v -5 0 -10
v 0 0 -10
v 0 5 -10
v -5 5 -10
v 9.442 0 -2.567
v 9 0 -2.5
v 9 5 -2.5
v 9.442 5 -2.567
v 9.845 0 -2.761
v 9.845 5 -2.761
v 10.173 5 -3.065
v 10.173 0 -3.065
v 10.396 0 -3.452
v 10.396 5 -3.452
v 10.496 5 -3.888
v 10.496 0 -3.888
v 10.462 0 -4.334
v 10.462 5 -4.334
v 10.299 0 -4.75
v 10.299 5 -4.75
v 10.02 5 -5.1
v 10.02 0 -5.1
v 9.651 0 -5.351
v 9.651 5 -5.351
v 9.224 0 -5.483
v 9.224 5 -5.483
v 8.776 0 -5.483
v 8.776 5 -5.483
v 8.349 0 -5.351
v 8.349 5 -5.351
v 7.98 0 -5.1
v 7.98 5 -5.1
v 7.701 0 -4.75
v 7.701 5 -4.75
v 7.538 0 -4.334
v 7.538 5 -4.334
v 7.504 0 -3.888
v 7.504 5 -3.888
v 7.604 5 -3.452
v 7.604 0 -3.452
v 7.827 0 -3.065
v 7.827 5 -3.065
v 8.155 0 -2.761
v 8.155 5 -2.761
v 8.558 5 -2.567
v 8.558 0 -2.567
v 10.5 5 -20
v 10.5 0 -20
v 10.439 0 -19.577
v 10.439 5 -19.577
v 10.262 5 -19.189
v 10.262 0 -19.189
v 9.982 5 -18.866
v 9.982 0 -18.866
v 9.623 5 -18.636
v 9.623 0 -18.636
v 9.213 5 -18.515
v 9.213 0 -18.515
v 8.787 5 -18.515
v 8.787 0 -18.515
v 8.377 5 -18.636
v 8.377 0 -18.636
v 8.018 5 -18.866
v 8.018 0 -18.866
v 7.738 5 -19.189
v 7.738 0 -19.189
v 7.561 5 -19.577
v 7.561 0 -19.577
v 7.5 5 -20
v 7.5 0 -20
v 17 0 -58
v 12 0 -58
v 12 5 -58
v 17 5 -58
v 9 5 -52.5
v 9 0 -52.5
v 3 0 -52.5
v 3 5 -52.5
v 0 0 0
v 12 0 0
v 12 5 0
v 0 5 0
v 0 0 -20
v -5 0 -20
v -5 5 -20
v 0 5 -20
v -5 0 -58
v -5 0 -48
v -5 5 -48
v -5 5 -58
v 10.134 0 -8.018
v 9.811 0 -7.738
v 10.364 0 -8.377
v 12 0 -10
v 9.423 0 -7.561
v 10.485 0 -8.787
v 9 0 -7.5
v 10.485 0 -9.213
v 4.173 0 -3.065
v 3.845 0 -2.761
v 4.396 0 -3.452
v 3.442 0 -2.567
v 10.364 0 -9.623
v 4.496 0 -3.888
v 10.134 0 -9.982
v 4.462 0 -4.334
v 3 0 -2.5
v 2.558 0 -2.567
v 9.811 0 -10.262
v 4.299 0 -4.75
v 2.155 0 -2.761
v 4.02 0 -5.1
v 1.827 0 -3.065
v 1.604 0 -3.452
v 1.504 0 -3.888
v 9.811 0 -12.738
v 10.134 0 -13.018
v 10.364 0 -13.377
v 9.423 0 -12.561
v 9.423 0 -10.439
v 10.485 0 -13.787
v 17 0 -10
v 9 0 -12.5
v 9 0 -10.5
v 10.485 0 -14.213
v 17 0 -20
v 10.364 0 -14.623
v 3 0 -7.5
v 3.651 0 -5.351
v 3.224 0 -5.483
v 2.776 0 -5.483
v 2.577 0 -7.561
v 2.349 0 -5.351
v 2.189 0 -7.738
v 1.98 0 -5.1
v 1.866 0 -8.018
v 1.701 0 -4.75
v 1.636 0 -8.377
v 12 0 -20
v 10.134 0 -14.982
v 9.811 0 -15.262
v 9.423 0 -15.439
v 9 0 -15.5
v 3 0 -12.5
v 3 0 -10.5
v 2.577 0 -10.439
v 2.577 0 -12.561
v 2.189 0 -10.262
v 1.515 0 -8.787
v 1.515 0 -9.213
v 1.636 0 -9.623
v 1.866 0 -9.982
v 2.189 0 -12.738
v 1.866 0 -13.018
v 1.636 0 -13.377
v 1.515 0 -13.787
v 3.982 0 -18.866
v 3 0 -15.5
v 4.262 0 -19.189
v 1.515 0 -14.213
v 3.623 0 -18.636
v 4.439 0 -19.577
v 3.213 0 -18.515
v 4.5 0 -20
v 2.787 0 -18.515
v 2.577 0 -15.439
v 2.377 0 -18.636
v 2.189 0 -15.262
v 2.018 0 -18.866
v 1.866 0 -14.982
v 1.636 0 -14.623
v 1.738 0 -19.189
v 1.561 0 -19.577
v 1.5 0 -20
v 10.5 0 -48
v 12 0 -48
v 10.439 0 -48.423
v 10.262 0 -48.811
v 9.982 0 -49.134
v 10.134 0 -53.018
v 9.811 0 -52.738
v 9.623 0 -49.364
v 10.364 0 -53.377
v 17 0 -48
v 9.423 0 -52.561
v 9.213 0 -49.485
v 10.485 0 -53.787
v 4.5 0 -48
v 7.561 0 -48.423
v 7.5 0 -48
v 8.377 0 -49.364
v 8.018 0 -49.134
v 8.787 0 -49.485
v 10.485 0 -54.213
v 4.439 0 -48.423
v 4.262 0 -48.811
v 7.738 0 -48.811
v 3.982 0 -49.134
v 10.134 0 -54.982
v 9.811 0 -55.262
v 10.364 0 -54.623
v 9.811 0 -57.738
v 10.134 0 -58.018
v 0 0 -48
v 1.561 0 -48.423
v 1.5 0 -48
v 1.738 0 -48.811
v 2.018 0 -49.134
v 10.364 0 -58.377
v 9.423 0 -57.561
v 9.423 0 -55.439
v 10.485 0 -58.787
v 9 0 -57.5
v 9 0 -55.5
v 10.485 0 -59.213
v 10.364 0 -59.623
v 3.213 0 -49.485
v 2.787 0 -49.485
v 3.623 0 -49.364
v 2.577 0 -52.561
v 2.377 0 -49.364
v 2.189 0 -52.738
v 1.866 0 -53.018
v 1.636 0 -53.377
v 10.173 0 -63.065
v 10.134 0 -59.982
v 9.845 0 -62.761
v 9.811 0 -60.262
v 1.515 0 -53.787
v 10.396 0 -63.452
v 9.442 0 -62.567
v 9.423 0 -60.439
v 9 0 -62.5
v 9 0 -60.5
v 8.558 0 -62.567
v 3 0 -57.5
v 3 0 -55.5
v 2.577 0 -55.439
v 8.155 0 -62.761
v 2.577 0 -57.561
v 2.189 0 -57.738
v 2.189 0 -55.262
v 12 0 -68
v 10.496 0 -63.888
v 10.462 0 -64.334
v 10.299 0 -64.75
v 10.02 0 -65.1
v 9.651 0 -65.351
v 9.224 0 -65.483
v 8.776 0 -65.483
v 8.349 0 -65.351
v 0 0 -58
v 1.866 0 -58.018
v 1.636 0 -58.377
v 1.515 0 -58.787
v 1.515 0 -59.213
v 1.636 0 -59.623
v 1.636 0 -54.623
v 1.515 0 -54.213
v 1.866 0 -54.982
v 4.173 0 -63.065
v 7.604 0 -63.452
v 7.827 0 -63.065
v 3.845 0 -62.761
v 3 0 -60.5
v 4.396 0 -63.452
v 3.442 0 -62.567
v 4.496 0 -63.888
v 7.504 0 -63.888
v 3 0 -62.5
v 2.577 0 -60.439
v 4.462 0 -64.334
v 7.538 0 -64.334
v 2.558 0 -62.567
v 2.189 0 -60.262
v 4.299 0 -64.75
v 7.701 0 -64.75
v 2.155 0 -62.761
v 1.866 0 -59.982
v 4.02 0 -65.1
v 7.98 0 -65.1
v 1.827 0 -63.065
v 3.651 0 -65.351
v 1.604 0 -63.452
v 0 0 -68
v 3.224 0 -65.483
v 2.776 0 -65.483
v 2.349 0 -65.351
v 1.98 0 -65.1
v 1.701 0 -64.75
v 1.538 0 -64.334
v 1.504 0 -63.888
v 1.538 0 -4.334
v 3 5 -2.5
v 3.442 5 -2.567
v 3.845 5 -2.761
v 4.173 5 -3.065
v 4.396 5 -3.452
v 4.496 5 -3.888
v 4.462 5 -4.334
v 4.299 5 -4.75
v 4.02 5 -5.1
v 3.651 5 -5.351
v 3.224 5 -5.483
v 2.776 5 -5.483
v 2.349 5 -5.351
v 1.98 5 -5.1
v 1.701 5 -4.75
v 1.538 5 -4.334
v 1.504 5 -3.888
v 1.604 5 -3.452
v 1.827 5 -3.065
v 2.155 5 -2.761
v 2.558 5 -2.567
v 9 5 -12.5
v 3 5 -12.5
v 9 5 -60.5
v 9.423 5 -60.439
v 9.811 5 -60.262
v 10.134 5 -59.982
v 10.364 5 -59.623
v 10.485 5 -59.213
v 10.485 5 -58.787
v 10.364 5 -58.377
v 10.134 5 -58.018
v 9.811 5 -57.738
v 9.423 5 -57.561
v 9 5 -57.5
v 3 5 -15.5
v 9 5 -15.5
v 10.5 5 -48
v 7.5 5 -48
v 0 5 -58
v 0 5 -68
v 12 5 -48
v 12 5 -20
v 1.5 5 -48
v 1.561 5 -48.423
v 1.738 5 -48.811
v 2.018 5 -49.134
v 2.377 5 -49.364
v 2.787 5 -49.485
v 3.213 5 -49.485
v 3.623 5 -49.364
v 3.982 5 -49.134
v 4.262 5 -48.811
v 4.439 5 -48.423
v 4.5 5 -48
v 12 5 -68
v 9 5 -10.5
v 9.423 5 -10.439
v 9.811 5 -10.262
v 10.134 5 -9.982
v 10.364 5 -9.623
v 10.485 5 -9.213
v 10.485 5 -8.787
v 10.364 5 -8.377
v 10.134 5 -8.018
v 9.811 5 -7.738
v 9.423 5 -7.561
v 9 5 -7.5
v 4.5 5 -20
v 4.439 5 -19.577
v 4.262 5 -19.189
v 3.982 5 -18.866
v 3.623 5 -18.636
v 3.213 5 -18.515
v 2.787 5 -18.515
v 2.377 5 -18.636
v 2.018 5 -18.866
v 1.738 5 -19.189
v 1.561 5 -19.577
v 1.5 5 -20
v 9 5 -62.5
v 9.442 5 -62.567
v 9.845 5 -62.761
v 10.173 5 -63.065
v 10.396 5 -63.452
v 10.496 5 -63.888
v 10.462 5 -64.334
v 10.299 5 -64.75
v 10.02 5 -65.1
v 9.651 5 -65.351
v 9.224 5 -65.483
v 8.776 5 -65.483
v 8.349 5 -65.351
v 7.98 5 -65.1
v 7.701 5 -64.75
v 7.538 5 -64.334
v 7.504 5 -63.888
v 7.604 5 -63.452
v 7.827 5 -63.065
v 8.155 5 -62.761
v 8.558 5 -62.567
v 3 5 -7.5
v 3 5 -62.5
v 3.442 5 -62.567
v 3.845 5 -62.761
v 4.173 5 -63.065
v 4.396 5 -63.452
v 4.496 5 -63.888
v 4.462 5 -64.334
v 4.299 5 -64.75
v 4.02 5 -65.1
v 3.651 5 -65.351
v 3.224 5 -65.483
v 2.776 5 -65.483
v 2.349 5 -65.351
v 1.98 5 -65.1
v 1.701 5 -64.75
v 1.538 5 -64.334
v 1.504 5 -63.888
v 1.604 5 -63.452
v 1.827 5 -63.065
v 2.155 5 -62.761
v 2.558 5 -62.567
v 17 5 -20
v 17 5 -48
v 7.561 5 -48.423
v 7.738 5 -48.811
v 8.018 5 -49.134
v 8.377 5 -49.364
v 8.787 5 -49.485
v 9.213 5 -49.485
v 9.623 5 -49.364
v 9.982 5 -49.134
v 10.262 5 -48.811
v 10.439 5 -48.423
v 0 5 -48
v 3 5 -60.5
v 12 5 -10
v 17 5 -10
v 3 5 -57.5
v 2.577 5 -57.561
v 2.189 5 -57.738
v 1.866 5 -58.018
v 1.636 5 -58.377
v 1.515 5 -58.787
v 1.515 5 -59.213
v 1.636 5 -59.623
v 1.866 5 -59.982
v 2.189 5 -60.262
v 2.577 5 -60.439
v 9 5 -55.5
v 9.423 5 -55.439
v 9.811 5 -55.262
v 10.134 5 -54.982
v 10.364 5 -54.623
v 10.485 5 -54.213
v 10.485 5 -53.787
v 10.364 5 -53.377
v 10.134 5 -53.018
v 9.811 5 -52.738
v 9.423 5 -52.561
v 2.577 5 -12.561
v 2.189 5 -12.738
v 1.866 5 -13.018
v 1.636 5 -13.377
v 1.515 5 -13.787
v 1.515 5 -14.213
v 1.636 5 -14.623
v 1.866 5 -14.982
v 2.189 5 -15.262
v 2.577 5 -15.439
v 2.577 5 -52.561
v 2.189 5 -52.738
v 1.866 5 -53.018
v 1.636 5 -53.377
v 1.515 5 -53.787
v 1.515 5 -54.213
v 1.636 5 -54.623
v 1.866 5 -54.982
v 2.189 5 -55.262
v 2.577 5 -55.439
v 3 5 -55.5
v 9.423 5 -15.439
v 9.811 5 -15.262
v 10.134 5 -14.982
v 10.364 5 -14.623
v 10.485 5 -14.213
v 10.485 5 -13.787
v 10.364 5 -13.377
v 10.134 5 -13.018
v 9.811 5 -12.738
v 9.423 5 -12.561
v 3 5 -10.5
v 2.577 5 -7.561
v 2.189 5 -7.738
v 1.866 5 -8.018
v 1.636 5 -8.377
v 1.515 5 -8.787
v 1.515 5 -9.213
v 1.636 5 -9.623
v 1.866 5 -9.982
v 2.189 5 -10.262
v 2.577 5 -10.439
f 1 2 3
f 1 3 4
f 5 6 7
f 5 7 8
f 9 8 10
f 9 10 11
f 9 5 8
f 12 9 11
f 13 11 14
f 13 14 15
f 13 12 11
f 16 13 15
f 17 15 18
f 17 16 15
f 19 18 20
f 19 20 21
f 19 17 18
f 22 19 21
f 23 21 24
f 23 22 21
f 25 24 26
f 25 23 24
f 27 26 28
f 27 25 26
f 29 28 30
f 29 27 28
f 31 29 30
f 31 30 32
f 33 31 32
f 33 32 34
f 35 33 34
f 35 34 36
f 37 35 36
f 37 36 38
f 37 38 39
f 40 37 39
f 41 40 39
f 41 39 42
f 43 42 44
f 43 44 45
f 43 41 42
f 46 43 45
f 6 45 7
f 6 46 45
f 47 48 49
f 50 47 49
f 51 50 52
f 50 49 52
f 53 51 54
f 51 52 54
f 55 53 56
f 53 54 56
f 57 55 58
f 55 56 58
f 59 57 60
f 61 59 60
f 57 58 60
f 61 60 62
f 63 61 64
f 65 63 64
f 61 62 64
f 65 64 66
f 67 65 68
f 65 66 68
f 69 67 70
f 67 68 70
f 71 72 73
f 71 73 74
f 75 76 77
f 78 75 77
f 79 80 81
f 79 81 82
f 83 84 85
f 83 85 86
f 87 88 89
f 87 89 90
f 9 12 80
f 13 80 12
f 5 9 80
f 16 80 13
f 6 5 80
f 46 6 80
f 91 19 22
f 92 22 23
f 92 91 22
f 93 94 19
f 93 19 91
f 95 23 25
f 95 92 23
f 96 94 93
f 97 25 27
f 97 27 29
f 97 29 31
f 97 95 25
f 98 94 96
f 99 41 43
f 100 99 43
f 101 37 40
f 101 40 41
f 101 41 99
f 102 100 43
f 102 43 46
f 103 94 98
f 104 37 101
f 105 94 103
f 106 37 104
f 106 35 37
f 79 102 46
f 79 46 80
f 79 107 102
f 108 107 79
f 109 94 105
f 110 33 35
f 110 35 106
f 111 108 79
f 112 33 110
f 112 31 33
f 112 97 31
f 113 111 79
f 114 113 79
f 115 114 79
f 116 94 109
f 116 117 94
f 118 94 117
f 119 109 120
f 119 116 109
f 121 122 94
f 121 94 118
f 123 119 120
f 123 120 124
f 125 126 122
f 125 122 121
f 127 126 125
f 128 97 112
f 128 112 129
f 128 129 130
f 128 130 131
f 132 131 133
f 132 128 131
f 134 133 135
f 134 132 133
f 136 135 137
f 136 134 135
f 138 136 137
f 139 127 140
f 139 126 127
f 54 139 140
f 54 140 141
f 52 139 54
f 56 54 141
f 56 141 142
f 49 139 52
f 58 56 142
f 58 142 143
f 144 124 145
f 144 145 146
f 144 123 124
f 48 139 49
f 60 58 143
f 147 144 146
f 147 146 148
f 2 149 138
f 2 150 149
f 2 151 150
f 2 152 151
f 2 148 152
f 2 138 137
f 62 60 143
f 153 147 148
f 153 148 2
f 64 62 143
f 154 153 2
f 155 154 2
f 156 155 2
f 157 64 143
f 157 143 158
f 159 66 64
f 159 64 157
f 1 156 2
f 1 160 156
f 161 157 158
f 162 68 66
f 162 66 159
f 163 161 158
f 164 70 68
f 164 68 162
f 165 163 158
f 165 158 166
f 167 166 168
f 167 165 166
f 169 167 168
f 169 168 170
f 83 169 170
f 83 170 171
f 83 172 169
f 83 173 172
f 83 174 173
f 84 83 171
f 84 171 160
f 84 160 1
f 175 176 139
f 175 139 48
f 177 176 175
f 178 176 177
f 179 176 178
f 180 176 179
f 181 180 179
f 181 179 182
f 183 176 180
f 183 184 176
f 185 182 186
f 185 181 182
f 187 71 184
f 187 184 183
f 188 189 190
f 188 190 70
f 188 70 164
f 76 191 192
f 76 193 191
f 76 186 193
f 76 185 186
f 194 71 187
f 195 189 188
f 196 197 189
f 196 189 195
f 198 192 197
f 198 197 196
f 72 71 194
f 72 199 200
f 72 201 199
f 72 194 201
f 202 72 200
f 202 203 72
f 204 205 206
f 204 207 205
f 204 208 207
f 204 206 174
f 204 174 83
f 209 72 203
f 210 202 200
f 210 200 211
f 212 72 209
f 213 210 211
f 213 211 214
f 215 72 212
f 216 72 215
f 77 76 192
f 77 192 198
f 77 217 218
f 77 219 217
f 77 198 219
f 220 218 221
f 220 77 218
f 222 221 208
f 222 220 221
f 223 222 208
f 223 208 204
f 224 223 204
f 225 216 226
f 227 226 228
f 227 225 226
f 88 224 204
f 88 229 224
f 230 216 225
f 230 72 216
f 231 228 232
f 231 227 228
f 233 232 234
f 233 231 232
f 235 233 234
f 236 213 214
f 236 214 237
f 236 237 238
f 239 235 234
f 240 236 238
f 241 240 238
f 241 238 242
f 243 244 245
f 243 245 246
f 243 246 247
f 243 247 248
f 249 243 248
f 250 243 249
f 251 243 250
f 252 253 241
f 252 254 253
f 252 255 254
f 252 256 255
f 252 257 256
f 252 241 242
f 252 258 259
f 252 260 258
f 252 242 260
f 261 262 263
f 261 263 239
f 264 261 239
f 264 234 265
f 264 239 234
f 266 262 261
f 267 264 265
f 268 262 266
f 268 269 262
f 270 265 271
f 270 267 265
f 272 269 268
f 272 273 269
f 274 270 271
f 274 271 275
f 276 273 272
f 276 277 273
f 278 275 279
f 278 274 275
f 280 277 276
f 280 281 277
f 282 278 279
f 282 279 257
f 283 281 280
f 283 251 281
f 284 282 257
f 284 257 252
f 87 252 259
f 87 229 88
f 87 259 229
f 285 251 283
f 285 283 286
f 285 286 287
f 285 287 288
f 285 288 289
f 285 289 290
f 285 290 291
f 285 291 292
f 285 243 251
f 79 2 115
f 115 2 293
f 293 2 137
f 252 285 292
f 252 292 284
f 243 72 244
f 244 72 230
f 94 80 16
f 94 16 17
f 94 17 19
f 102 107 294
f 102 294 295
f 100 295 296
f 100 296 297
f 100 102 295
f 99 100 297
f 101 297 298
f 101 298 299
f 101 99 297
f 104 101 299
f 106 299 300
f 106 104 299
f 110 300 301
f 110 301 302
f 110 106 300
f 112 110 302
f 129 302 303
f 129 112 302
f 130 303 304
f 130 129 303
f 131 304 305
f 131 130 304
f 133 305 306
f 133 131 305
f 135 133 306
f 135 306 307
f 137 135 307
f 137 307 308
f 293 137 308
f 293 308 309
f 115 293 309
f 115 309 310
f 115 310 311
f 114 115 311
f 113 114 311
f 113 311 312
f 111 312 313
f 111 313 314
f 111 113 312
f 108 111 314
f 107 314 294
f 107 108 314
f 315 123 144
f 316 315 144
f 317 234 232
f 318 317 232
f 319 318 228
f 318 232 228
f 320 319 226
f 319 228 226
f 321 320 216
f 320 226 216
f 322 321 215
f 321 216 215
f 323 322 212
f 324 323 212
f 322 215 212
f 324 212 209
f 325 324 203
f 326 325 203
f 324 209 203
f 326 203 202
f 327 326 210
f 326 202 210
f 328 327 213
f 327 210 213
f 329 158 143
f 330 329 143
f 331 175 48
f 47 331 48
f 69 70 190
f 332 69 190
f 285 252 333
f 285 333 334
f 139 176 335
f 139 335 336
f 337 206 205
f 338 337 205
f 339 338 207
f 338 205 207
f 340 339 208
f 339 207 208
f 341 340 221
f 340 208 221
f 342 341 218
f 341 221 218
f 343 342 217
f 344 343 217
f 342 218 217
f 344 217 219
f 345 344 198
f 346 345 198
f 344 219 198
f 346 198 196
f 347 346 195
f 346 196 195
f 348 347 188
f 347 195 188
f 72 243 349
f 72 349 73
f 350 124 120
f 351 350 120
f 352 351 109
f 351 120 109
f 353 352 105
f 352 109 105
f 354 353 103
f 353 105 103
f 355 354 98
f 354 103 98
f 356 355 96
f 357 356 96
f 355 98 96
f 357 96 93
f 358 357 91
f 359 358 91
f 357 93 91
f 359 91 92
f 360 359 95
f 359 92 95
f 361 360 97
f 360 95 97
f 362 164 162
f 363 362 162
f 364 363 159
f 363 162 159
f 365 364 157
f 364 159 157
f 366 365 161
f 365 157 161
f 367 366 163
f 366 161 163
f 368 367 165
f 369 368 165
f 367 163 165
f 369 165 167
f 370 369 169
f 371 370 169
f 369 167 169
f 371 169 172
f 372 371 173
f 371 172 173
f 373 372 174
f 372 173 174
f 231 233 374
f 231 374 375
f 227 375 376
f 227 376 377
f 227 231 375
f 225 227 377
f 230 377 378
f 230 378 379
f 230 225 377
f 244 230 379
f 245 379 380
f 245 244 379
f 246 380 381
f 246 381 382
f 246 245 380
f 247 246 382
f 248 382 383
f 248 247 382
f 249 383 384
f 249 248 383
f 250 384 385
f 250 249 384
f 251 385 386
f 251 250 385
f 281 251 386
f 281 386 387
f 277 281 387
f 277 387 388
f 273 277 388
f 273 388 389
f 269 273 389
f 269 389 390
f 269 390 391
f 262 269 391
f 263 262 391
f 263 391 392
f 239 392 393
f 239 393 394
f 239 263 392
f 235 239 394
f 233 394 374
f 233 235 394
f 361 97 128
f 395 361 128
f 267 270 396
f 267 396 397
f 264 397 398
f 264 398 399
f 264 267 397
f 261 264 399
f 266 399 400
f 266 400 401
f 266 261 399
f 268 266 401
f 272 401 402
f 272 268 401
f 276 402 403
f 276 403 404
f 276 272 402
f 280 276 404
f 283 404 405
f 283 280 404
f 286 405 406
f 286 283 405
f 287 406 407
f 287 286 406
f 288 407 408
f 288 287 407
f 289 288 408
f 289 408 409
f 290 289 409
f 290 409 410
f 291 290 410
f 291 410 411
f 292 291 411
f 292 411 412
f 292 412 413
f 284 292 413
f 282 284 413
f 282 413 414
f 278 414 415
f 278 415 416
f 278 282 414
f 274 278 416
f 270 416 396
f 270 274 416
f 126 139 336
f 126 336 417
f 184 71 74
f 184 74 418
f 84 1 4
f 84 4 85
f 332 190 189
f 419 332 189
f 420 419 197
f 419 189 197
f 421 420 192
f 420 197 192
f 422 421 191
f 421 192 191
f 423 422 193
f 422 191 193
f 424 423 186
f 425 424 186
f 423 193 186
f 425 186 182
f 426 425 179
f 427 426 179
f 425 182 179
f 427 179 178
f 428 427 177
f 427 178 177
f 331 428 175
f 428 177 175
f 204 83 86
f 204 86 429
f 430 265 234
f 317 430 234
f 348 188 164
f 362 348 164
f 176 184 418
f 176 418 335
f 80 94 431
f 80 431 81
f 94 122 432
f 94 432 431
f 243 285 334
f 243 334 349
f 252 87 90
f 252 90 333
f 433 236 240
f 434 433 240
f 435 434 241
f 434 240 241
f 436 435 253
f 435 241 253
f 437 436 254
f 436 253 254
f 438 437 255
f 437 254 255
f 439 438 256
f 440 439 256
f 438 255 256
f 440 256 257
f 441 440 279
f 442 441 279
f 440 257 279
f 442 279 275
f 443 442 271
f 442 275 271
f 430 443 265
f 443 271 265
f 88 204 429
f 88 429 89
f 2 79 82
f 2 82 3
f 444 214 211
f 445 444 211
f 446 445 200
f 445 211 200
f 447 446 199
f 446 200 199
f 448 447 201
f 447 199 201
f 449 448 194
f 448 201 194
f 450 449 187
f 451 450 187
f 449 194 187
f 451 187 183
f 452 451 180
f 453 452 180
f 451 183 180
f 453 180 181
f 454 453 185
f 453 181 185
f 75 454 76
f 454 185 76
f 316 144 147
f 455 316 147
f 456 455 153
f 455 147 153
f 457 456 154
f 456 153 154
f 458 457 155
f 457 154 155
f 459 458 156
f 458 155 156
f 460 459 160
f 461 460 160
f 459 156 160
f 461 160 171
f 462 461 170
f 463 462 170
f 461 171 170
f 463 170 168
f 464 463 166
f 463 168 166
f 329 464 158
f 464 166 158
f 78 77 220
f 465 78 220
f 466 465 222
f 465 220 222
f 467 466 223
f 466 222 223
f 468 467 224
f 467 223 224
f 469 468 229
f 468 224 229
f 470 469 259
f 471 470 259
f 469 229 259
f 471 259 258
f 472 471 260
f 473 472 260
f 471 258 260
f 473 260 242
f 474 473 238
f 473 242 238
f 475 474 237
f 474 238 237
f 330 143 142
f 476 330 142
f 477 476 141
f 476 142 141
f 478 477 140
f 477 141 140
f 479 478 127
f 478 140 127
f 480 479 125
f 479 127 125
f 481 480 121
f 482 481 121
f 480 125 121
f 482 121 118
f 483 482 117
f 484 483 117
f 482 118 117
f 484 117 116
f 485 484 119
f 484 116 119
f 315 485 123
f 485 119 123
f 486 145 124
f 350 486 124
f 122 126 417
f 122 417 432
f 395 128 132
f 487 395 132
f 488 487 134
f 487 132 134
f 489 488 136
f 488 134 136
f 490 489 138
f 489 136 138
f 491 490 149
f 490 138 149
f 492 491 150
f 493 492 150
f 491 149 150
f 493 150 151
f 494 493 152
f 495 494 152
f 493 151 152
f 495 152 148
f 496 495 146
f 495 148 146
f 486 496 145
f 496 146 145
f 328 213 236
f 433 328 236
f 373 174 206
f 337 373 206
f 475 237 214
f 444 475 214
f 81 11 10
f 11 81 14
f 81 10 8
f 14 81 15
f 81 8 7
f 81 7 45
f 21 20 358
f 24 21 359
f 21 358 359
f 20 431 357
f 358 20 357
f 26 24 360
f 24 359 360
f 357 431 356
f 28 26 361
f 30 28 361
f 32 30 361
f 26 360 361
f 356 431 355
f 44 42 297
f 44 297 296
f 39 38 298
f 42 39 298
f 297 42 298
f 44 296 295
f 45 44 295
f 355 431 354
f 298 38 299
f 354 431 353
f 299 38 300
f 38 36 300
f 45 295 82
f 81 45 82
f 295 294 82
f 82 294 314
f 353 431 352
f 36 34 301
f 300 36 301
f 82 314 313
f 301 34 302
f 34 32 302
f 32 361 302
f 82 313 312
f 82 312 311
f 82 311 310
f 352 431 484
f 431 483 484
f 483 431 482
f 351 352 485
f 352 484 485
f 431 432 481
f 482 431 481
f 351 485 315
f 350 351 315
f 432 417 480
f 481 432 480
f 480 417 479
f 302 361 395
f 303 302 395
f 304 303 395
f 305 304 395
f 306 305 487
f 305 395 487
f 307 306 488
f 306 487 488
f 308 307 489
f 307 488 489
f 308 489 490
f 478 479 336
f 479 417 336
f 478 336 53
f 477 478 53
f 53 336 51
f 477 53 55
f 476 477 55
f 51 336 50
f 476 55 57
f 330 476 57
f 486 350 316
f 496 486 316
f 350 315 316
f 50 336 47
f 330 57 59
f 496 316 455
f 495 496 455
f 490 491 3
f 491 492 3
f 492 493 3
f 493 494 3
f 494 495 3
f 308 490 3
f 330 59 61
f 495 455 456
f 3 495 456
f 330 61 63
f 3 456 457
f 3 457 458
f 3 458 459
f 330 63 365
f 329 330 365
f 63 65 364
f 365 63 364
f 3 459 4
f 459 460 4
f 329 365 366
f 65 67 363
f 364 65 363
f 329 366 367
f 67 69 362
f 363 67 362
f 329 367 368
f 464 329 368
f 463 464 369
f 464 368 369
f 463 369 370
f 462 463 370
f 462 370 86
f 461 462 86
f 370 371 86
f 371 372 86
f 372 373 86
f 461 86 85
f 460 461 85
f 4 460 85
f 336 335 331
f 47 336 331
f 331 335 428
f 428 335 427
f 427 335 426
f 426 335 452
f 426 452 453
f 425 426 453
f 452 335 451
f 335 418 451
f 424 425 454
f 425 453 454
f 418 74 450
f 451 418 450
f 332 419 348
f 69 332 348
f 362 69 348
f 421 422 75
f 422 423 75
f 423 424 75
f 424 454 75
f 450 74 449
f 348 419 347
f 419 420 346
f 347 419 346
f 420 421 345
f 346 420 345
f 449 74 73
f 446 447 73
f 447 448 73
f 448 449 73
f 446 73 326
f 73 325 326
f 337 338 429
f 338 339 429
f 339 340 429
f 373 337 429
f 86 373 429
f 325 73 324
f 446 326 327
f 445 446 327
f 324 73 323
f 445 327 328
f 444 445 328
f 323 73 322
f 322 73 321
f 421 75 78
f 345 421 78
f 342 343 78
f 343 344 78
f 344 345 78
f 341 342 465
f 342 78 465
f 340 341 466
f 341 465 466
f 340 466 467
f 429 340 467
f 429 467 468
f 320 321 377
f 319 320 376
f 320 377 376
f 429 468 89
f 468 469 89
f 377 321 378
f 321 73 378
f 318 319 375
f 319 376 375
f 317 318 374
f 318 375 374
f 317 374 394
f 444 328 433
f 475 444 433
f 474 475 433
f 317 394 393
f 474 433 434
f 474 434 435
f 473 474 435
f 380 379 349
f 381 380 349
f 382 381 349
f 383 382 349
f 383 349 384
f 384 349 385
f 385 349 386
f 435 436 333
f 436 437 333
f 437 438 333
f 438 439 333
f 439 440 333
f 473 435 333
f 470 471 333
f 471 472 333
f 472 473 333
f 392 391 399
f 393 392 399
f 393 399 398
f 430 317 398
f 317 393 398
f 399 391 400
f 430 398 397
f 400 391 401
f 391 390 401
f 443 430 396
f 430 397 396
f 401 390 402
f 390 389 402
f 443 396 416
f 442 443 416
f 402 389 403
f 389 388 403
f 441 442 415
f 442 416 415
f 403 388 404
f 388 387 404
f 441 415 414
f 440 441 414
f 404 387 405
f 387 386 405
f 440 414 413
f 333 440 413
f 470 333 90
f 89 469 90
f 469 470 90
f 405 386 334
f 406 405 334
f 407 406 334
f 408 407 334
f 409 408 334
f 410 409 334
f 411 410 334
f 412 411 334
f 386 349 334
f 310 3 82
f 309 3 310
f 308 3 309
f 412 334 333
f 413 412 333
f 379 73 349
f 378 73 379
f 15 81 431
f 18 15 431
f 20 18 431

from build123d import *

# Parameters (mm, degrees)
SKETCH_1_R      = 1.5
EXTRUDE_1_DEPTH = 5


with BuildPart() as part:
    # 草图1 → 凸台-拉伸1 (new body)
    with BuildSketch(Plane(origin=(0, 0, 0), x_dir=(1, 0, 0), z_dir=(0, 1, 0))):
        Polygon((0, 0), (0, 10), (-5, 10), (-5, 20), (0, 20), (0, 48), (-5, 48), (-5, 58), (0, 58), (0, 68), (12, 68), (12, 58), (17, 58), (17, 48), (12, 48), (12, 20), (17, 20), (17, 10), (12, 10), (12, 0), align=None)
        with Locations(Location((3, 64, 0), (0, 0, 270))):
            Circle(SKETCH_1_R, mode=Mode.SUBTRACT)
        with Locations(Location((9, 64, 0), (0, 0, 270))):
            Circle(SKETCH_1_R, mode=Mode.SUBTRACT)
        with Locations(Location((3, 4, 0), (0, 0, 270))):
            Circle(SKETCH_1_R, mode=Mode.SUBTRACT)
        with Locations(Location((9, 4, 0), (0, 0, 270))):
            Circle(SKETCH_1_R, mode=Mode.SUBTRACT)
        with BuildLine():
            Line((3, 55.5), (9, 55.5))
            ThreePointArc((9, 55.5), (10.5, 54), (9, 52.5))
            Line((9, 52.5), (3, 52.5))
            ThreePointArc((3, 52.5), (1.5, 54), (3, 55.5))
        make_face(mode=Mode.SUBTRACT)
        with BuildLine():
            Line((3, 15.5), (9, 15.5))
            ThreePointArc((9, 15.5), (10.5, 14), (9, 12.5))
            Line((9, 12.5), (3, 12.5))
            ThreePointArc((3, 12.5), (1.5, 14), (3, 15.5))
        make_face(mode=Mode.SUBTRACT)
        with BuildLine():
            Line((4.5, 48), (4.5, 20))
            ThreePointArc((4.5, 20), (3, 18.5), (1.5, 20))
            Line((1.5, 20), (1.5, 48))
            ThreePointArc((1.5, 48), (3, 49.5), (4.5, 48))
        make_face(mode=Mode.SUBTRACT)
        with BuildLine():
            Line((10.5, 48), (10.5, 20))
            ThreePointArc((10.5, 20), (9, 18.5), (7.5, 20))
            Line((7.5, 20), (7.5, 48))
            ThreePointArc((7.5, 48), (9, 49.5), (10.5, 48))
        make_face(mode=Mode.SUBTRACT)
        with BuildLine():
            Line((3, 60.5), (9, 60.5))
            ThreePointArc((9, 60.5), (10.5, 59), (9, 57.5))
            Line((9, 57.5), (3, 57.5))
            ThreePointArc((3, 57.5), (1.5, 59), (3, 60.5))
        make_face(mode=Mode.SUBTRACT)
        with BuildLine():
            Line((3, 10.5), (9, 10.5))
            ThreePointArc((9, 10.5), (10.5, 9), (9, 7.5))
            Line((9, 7.5), (3, 7.5))
            ThreePointArc((3, 7.5), (1.5, 9), (3, 10.5))
        make_face(mode=Mode.SUBTRACT)
    extrude(amount=EXTRUDE_1_DEPTH)


solid = part.part
